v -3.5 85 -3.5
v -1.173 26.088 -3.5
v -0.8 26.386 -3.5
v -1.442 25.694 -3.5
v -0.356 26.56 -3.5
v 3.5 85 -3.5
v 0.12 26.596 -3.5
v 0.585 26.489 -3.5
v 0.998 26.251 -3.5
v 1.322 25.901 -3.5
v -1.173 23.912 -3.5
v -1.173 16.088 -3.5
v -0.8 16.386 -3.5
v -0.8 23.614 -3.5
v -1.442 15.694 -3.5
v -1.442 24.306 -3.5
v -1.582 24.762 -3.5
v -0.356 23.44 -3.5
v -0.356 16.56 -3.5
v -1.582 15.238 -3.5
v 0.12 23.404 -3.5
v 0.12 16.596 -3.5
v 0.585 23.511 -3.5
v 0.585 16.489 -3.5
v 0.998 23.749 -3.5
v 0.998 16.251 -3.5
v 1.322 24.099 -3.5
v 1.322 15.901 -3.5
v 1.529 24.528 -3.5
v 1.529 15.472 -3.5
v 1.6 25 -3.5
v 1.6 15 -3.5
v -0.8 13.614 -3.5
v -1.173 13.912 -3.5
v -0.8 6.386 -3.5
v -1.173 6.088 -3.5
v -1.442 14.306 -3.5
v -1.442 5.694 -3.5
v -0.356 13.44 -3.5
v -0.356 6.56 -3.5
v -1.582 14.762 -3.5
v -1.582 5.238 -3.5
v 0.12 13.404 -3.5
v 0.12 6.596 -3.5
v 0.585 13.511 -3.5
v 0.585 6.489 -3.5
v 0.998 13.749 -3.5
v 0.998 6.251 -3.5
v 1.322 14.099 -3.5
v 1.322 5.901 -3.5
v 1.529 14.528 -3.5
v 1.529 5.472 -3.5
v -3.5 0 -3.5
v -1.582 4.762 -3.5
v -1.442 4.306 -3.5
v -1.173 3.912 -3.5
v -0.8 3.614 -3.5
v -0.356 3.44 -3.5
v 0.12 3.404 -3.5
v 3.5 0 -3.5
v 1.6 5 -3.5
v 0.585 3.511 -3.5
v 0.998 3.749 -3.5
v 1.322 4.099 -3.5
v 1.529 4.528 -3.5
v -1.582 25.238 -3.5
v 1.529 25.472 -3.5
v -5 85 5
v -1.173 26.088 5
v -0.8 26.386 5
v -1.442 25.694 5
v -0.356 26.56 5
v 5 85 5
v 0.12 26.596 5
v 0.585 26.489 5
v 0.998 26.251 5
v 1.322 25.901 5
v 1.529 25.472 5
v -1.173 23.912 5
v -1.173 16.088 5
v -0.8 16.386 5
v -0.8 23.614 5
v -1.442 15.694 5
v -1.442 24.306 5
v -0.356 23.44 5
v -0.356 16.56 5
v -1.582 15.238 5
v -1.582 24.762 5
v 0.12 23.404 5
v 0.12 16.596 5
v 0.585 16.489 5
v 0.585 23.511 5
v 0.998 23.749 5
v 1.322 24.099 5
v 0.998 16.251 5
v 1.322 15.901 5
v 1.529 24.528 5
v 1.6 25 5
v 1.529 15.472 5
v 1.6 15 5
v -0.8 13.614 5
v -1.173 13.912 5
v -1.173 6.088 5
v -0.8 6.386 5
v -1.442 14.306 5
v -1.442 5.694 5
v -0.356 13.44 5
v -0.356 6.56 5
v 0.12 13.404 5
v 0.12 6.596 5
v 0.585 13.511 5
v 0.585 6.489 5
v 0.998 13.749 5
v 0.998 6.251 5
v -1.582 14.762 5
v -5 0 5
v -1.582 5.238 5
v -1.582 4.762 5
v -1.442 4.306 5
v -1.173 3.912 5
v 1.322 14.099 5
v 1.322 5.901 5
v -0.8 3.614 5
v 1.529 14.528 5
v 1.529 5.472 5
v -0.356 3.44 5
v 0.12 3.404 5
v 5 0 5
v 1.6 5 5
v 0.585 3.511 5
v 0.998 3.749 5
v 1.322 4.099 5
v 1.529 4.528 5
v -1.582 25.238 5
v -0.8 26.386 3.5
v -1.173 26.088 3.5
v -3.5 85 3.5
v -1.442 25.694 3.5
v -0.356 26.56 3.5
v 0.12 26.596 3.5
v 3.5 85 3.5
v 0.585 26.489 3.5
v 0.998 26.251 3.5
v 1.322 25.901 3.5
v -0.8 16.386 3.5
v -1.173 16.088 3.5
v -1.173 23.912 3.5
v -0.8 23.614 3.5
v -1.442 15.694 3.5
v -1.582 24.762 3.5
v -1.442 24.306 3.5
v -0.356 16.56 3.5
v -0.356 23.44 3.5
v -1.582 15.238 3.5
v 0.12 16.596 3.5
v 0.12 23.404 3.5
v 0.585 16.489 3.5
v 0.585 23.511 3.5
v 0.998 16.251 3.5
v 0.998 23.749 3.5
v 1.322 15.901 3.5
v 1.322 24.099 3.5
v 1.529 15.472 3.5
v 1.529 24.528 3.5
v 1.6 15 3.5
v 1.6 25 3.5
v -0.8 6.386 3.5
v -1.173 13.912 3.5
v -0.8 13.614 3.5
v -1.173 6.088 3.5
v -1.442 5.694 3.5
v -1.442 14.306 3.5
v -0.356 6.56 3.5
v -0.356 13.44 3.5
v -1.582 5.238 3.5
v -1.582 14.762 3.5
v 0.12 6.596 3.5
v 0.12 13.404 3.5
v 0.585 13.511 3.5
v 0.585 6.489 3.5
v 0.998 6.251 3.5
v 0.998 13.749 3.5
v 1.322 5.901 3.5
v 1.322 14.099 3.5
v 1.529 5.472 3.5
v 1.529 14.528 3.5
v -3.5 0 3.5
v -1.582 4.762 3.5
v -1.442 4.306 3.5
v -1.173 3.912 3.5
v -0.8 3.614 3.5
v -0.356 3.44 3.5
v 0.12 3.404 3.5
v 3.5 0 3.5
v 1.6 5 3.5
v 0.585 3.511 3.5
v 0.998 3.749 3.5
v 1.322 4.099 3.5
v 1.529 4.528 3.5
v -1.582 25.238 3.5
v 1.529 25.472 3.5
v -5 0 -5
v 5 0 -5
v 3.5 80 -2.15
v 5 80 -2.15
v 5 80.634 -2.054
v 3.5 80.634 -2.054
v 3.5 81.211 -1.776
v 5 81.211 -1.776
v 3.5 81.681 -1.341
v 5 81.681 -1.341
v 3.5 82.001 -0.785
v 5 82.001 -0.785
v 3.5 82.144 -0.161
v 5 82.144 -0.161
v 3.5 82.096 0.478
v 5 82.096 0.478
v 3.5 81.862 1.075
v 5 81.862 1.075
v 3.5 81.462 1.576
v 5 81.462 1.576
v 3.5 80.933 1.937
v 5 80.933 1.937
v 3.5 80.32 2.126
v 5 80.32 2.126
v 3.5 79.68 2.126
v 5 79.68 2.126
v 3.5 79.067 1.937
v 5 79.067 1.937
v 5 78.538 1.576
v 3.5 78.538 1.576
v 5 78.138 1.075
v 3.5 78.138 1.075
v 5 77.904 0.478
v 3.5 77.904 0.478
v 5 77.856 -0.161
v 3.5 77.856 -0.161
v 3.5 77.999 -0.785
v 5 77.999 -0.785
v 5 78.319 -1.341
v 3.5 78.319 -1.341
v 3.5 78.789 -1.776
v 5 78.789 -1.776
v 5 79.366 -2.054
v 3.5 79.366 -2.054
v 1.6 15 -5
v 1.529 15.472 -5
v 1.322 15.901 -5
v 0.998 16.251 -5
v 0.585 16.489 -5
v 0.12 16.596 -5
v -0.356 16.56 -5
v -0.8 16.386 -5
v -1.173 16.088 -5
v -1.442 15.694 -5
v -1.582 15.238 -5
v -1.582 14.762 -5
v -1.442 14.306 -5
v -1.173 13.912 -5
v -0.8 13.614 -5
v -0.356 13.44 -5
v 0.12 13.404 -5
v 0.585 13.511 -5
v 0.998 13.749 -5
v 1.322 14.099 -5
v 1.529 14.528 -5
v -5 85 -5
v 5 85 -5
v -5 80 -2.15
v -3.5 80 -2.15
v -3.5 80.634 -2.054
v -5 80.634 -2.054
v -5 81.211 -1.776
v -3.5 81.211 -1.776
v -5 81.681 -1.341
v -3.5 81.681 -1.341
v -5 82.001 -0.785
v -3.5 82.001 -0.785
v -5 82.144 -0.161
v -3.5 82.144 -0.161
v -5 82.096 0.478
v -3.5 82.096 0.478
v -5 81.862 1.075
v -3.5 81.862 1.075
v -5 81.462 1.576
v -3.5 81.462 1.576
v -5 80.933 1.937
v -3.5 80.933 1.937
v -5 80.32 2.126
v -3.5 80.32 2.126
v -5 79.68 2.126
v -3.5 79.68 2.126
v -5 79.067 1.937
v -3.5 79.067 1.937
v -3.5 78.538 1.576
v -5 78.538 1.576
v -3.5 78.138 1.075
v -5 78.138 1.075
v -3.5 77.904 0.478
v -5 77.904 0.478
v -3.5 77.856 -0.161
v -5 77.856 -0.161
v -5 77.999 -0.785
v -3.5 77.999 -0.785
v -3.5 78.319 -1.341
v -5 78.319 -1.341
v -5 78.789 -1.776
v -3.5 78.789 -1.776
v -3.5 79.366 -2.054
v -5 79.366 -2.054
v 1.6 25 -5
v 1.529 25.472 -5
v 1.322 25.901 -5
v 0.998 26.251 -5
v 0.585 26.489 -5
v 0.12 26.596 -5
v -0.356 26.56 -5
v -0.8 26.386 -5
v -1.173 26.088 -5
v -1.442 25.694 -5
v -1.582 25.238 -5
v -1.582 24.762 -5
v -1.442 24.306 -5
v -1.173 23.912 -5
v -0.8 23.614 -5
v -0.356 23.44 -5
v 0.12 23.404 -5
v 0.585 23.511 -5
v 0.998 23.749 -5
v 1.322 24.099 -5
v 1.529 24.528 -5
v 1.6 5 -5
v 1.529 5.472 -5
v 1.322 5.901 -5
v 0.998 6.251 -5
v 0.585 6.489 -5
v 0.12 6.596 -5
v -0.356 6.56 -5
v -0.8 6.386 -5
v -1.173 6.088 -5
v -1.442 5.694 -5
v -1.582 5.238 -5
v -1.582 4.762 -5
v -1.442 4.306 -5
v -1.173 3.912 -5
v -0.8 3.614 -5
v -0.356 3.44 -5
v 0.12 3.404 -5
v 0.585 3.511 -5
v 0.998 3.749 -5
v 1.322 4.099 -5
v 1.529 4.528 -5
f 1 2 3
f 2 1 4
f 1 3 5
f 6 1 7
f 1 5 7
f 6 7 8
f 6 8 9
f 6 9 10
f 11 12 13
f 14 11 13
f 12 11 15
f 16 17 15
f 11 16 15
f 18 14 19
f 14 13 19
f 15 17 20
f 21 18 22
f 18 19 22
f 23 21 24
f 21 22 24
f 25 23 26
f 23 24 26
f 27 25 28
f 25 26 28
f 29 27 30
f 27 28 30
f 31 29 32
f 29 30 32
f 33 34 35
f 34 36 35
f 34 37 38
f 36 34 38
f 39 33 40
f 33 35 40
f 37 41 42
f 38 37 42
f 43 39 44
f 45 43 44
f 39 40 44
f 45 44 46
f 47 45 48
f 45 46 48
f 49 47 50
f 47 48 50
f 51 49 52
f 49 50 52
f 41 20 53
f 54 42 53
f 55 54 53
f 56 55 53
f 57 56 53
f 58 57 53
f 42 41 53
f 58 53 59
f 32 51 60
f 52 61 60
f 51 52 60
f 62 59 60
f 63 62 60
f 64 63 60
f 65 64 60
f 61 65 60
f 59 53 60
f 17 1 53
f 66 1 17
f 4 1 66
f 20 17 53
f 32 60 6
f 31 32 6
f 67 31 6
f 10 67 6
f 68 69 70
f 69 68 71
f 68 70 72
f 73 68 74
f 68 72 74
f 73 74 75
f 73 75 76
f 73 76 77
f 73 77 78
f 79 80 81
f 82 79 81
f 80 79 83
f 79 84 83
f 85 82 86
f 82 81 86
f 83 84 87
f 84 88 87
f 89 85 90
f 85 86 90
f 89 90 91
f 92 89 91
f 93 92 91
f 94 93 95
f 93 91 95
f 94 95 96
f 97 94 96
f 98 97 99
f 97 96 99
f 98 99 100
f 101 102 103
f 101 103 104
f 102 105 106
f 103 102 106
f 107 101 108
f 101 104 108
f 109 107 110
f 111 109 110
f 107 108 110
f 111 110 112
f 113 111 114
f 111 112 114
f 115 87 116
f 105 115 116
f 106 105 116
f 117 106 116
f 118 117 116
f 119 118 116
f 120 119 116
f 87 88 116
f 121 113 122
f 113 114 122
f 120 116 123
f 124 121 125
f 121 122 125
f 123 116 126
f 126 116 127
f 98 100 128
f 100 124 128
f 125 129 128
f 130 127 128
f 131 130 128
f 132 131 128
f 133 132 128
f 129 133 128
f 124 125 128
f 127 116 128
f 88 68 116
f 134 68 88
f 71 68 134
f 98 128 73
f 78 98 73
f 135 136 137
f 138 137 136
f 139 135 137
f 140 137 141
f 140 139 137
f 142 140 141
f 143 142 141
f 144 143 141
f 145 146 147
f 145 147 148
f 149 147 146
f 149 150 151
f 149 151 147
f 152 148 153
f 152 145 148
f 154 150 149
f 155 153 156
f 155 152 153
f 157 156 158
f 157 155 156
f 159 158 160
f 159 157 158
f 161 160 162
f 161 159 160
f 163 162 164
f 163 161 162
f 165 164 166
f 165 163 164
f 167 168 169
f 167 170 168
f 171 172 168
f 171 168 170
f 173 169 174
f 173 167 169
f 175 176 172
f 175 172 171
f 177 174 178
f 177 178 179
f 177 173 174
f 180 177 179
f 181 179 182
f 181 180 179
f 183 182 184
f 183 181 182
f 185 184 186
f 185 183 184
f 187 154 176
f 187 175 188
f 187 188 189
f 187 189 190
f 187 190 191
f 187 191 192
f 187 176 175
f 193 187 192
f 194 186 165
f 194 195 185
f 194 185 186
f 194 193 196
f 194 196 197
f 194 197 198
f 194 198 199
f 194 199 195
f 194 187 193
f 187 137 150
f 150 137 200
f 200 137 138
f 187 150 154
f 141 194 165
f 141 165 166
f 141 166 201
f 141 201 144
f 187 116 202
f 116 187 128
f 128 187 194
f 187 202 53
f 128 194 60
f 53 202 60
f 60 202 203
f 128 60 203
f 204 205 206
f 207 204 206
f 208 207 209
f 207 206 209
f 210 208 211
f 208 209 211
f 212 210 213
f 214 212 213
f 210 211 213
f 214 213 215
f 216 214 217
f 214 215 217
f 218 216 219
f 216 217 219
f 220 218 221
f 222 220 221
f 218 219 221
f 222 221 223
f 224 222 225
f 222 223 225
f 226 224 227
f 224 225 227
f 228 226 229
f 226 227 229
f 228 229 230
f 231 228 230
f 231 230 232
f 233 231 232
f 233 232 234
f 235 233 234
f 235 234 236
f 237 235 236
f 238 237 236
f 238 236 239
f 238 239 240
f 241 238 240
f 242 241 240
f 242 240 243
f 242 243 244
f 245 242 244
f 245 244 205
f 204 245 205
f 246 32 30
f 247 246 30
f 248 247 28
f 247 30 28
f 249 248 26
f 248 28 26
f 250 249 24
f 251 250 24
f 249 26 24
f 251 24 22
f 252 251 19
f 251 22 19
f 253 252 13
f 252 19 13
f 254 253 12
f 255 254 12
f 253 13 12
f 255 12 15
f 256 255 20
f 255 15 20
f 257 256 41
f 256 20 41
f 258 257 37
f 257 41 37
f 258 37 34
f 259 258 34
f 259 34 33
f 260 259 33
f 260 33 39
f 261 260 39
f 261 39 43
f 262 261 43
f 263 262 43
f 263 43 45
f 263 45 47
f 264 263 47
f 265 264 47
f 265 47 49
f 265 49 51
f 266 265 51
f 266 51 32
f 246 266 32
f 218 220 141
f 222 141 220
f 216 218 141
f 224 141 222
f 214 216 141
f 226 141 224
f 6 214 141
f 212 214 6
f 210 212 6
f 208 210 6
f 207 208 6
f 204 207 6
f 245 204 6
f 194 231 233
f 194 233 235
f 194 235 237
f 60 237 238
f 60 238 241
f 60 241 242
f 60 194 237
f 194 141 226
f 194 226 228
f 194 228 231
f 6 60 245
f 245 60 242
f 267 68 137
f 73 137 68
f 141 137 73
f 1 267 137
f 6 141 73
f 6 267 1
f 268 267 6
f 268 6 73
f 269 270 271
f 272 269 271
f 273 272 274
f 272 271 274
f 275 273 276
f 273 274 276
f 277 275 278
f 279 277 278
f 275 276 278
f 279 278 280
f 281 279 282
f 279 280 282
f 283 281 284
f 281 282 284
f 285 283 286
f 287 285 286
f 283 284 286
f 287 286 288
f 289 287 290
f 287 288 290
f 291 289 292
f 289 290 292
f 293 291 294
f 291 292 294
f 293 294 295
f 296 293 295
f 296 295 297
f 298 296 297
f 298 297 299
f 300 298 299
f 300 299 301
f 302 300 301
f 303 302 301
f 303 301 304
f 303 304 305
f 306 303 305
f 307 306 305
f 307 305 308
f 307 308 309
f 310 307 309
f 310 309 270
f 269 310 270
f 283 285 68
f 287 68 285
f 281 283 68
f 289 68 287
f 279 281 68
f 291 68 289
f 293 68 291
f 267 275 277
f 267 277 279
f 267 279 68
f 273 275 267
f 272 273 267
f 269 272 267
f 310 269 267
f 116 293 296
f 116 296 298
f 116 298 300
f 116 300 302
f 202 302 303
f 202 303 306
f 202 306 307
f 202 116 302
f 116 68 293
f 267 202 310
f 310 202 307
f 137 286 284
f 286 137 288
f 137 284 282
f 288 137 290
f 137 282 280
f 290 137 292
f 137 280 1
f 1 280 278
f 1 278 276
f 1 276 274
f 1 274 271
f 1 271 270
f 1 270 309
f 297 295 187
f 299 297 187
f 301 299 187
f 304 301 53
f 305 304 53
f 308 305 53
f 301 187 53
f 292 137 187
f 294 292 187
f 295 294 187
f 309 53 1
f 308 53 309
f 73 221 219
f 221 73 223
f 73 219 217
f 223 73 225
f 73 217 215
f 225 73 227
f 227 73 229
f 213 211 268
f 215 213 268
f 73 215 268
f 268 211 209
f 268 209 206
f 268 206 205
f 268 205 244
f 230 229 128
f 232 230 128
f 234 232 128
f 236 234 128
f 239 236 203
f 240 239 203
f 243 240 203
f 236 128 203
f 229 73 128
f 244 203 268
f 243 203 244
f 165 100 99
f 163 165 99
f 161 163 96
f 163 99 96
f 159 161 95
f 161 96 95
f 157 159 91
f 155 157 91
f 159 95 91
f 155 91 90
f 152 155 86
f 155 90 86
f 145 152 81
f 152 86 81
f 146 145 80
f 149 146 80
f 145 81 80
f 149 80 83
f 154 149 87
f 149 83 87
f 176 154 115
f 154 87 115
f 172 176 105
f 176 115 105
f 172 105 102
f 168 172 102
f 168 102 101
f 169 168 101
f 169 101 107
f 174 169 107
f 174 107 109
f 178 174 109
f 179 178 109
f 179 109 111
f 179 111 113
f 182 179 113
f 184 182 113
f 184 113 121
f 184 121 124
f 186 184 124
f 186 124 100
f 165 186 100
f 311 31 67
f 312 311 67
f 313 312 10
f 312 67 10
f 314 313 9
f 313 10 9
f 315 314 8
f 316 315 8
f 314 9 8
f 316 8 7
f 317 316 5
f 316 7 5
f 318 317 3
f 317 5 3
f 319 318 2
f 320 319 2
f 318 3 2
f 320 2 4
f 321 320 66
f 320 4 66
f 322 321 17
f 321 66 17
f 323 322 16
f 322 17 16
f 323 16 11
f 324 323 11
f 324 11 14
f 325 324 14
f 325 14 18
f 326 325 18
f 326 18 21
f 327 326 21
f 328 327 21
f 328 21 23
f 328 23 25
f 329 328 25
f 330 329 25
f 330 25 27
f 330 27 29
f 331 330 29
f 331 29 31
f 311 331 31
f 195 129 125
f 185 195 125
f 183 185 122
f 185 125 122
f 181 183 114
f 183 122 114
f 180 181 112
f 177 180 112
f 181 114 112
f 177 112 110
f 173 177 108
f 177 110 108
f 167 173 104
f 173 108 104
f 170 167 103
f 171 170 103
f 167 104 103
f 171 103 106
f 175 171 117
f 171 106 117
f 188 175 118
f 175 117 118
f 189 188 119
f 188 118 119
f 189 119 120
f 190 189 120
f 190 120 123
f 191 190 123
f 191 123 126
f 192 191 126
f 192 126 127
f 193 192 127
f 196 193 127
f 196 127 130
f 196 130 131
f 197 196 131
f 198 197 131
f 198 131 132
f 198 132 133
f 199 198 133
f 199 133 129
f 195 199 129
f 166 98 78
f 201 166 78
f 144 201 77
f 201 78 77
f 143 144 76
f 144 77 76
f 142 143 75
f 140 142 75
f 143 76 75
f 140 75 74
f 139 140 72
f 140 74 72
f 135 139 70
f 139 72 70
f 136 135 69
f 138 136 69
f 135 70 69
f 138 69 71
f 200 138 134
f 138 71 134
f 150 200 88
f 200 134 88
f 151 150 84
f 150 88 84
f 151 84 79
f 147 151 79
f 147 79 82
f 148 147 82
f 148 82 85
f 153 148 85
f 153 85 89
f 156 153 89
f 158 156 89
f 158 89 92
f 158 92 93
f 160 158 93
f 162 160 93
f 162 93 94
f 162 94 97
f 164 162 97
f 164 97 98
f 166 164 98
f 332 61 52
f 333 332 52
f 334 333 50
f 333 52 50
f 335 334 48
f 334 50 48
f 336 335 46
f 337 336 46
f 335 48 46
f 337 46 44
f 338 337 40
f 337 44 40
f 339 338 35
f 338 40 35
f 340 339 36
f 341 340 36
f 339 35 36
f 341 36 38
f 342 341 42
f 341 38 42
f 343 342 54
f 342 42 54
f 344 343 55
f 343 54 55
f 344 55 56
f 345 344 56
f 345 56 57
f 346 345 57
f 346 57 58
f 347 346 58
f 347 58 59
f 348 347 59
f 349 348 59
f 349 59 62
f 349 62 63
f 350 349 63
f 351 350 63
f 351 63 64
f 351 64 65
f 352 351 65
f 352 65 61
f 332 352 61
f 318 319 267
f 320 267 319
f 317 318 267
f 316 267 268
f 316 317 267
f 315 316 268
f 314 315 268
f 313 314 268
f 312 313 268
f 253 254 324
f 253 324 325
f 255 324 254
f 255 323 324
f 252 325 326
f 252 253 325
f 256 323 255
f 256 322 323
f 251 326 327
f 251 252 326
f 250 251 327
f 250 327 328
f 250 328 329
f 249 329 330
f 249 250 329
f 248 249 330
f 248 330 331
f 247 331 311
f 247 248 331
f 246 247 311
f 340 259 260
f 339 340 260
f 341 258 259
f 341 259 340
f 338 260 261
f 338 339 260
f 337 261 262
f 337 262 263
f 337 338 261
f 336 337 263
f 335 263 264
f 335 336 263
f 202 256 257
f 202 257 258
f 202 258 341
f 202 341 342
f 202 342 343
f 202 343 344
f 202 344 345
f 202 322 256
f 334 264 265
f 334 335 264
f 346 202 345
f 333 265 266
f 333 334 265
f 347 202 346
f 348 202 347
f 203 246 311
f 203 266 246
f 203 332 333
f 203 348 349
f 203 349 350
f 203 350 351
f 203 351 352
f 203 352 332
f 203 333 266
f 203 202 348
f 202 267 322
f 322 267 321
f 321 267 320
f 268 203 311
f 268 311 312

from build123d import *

# Parameters (mm, degrees)
SKETCH_1_W          = 10
SKETCH_1_H          = 10
SKETCH_1_W_2        = 7
SKETCH_1_H_2        = 7
EXTRUDE_1_DEPTH     = 85
SKETCH_2_R          = 1.6
CUT_EXTRUDE_1_DEPTH = 86.732140997
SKETCH_3_R          = 2.15
CUT_EXTRUDE_2_DEPTH = 86.732140997


with BuildPart() as part:
    # ｽｹｯﾁ1 → 押し出し-薄板1 (new body)
    with BuildSketch(Plane(origin=(0, 0, 0), x_dir=(1, 0, 0), z_dir=(0, 1, 0))):
        Rectangle(SKETCH_1_W, SKETCH_1_H)
        Rectangle(SKETCH_1_W_2, SKETCH_1_H_2, mode=Mode.SUBTRACT)
    extrude(amount=EXTRUDE_1_DEPTH)

    # ｽｹｯﾁ2 → ｶｯﾄ - 押し出し1 (cut, through all)
    with BuildSketch(Plane.XY.offset(5)):
        with Locations((0, 25)):
            Circle(SKETCH_2_R)
        with Locations((0, 5)):
            Circle(SKETCH_2_R)
        with Locations((0, 15)):
            Circle(SKETCH_2_R)
    extrude(amount=-CUT_EXTRUDE_1_DEPTH, mode=Mode.SUBTRACT)

    # ｽｹｯﾁ3 → ｶｯﾄ - 押し出し2 (cut, through all)
    with BuildSketch(Plane(origin=(5, 0, 0), x_dir=(0, 0, -1), z_dir=(1, 0, 0))):
        with Locations((0, 80)):
            Circle(SKETCH_3_R)
    extrude(amount=-CUT_EXTRUDE_2_DEPTH, mode=Mode.SUBTRACT)


solid = part.part
